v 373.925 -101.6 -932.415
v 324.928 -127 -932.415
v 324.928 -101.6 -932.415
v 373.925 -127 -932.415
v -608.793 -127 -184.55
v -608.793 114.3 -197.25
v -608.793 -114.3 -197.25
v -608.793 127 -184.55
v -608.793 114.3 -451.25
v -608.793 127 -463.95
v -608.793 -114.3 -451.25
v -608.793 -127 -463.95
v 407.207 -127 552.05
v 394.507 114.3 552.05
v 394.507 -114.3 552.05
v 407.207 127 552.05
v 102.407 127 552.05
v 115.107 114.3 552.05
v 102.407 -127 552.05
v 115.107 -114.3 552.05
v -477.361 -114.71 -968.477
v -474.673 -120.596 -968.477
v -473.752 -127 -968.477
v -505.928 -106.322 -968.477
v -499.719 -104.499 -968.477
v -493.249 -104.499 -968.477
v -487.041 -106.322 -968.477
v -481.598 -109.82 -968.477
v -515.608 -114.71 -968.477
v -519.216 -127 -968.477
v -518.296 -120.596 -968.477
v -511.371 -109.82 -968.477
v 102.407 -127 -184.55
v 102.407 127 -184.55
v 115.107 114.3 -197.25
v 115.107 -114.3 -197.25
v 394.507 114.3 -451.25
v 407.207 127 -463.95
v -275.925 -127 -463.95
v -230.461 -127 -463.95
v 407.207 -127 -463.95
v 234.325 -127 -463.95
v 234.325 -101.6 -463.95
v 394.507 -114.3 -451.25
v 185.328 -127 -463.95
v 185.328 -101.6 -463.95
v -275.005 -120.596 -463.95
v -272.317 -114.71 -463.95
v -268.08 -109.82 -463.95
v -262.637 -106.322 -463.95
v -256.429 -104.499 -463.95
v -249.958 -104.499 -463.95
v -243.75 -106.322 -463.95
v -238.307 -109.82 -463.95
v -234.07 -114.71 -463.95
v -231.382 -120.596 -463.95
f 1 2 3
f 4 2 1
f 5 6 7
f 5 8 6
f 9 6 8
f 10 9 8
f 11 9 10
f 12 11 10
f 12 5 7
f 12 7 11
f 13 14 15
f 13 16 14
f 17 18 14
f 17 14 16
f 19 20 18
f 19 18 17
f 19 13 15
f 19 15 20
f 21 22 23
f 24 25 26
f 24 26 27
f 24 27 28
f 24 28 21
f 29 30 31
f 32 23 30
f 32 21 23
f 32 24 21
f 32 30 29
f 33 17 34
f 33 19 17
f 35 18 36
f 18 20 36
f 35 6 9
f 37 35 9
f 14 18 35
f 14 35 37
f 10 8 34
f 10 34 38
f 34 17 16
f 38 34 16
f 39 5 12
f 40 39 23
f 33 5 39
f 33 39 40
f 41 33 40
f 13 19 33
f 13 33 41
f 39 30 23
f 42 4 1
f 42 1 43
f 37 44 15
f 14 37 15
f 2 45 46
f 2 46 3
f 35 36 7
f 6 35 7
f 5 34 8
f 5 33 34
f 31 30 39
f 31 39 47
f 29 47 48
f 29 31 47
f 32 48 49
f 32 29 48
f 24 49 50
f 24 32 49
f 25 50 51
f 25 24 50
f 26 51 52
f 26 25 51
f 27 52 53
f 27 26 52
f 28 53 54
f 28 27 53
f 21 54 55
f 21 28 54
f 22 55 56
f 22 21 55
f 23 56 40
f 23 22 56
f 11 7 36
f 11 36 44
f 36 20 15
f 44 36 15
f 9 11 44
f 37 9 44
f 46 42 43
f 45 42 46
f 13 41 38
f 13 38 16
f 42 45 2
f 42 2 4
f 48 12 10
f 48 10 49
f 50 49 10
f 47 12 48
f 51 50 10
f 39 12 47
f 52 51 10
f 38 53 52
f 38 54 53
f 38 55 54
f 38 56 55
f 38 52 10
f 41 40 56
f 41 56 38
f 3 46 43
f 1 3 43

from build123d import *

# Parameters (mm, degrees)
F1_DEPTH  = 127
F2_T      = -12.7
F3_W      = 228.6
F3_H      = 254
F4_DEPTH  = 25.4
F8_DEPTH  = 25.4
F11_DEPTH = 38.1


with BuildPart() as f1:
    # F0 (on Front) → F1 (new body, symmetric)
    with BuildSketch(Plane.XZ):
        Polygon((-608.7934243917, -184.549812434), (-608.7934243917, -463.949812434), (407.2065756083, -463.949812434), (407.2065756083, 552.050187566), (102.4065756083, 552.050187566), (102.4065756083, -184.549812434), align=None)
    extrude(amount=F1_DEPTH, both=True)

    # F2
    f2_openings = [f1.faces().sort_by_distance(p)[0] for p in [
        (254.806576, 0, 552.050188),
    ]]
    offset(amount=F2_T, openings=f2_openings, kind=Kind.INTERSECTION)

    # F3 (on face) → F4 (cut)
    with BuildSketch(Plane(origin=(-608.7934243917, 0, 0), x_dir=(0, -1, 0), z_dir=(-1, 0, 0))):
        with Locations((0, -324.249812434)):
            Rectangle(F3_W, F3_H)
    extrude(amount=-F4_DEPTH, mode=Mode.SUBTRACT)

    # F7: sweep along a path in F5
    with BuildLine(Plane.XZ.offset(127)) as f7_path:
        Line((-244.6788847446, -463.949812434), (-487.969815731, -968.4772491455))
    # F6 (on face) → F7 (sweep)
    with BuildSketch(Plane(origin=(0, 0, -463.949812434), x_dir=(1, 0, 0), z_dir=(0, 0, -1))):
        with BuildLine():
            ThreePointArc((-275.9253751284, 127), (-253.1934243917, 104.2680492633), (-230.461473655, 127))
            Line((-230.461473655, 127), (-275.9253751284, 127))
        make_face()
    sweep(path=f7_path.line)


with BuildPart() as f8:
    # F5 (on face) → F8 (new body)
    with BuildSketch(Plane.XZ.offset(127)):
        Polygon((234.3254238367, -463.949812434), (185.3277683258, -463.949812434), (324.9278366566, -932.414829731), (373.9254921675, -932.414829731), align=None)
    extrude(amount=-F8_DEPTH)


with BuildPart() as f11:
    # F10 (on offset) → F11 (new body, symmetric)
    with BuildSketch(Plane.YZ.offset(204.0065756083)):
        Polygon((-68.0237669945, -463.949812434), (-127, -463.949812434), (-474.1689562798, -907.5912833214), (-415.1927232742, -907.5912833214), align=None)
    extrude(amount=F11_DEPTH, both=True)


solid = Compound([f1.part, f8.part])
